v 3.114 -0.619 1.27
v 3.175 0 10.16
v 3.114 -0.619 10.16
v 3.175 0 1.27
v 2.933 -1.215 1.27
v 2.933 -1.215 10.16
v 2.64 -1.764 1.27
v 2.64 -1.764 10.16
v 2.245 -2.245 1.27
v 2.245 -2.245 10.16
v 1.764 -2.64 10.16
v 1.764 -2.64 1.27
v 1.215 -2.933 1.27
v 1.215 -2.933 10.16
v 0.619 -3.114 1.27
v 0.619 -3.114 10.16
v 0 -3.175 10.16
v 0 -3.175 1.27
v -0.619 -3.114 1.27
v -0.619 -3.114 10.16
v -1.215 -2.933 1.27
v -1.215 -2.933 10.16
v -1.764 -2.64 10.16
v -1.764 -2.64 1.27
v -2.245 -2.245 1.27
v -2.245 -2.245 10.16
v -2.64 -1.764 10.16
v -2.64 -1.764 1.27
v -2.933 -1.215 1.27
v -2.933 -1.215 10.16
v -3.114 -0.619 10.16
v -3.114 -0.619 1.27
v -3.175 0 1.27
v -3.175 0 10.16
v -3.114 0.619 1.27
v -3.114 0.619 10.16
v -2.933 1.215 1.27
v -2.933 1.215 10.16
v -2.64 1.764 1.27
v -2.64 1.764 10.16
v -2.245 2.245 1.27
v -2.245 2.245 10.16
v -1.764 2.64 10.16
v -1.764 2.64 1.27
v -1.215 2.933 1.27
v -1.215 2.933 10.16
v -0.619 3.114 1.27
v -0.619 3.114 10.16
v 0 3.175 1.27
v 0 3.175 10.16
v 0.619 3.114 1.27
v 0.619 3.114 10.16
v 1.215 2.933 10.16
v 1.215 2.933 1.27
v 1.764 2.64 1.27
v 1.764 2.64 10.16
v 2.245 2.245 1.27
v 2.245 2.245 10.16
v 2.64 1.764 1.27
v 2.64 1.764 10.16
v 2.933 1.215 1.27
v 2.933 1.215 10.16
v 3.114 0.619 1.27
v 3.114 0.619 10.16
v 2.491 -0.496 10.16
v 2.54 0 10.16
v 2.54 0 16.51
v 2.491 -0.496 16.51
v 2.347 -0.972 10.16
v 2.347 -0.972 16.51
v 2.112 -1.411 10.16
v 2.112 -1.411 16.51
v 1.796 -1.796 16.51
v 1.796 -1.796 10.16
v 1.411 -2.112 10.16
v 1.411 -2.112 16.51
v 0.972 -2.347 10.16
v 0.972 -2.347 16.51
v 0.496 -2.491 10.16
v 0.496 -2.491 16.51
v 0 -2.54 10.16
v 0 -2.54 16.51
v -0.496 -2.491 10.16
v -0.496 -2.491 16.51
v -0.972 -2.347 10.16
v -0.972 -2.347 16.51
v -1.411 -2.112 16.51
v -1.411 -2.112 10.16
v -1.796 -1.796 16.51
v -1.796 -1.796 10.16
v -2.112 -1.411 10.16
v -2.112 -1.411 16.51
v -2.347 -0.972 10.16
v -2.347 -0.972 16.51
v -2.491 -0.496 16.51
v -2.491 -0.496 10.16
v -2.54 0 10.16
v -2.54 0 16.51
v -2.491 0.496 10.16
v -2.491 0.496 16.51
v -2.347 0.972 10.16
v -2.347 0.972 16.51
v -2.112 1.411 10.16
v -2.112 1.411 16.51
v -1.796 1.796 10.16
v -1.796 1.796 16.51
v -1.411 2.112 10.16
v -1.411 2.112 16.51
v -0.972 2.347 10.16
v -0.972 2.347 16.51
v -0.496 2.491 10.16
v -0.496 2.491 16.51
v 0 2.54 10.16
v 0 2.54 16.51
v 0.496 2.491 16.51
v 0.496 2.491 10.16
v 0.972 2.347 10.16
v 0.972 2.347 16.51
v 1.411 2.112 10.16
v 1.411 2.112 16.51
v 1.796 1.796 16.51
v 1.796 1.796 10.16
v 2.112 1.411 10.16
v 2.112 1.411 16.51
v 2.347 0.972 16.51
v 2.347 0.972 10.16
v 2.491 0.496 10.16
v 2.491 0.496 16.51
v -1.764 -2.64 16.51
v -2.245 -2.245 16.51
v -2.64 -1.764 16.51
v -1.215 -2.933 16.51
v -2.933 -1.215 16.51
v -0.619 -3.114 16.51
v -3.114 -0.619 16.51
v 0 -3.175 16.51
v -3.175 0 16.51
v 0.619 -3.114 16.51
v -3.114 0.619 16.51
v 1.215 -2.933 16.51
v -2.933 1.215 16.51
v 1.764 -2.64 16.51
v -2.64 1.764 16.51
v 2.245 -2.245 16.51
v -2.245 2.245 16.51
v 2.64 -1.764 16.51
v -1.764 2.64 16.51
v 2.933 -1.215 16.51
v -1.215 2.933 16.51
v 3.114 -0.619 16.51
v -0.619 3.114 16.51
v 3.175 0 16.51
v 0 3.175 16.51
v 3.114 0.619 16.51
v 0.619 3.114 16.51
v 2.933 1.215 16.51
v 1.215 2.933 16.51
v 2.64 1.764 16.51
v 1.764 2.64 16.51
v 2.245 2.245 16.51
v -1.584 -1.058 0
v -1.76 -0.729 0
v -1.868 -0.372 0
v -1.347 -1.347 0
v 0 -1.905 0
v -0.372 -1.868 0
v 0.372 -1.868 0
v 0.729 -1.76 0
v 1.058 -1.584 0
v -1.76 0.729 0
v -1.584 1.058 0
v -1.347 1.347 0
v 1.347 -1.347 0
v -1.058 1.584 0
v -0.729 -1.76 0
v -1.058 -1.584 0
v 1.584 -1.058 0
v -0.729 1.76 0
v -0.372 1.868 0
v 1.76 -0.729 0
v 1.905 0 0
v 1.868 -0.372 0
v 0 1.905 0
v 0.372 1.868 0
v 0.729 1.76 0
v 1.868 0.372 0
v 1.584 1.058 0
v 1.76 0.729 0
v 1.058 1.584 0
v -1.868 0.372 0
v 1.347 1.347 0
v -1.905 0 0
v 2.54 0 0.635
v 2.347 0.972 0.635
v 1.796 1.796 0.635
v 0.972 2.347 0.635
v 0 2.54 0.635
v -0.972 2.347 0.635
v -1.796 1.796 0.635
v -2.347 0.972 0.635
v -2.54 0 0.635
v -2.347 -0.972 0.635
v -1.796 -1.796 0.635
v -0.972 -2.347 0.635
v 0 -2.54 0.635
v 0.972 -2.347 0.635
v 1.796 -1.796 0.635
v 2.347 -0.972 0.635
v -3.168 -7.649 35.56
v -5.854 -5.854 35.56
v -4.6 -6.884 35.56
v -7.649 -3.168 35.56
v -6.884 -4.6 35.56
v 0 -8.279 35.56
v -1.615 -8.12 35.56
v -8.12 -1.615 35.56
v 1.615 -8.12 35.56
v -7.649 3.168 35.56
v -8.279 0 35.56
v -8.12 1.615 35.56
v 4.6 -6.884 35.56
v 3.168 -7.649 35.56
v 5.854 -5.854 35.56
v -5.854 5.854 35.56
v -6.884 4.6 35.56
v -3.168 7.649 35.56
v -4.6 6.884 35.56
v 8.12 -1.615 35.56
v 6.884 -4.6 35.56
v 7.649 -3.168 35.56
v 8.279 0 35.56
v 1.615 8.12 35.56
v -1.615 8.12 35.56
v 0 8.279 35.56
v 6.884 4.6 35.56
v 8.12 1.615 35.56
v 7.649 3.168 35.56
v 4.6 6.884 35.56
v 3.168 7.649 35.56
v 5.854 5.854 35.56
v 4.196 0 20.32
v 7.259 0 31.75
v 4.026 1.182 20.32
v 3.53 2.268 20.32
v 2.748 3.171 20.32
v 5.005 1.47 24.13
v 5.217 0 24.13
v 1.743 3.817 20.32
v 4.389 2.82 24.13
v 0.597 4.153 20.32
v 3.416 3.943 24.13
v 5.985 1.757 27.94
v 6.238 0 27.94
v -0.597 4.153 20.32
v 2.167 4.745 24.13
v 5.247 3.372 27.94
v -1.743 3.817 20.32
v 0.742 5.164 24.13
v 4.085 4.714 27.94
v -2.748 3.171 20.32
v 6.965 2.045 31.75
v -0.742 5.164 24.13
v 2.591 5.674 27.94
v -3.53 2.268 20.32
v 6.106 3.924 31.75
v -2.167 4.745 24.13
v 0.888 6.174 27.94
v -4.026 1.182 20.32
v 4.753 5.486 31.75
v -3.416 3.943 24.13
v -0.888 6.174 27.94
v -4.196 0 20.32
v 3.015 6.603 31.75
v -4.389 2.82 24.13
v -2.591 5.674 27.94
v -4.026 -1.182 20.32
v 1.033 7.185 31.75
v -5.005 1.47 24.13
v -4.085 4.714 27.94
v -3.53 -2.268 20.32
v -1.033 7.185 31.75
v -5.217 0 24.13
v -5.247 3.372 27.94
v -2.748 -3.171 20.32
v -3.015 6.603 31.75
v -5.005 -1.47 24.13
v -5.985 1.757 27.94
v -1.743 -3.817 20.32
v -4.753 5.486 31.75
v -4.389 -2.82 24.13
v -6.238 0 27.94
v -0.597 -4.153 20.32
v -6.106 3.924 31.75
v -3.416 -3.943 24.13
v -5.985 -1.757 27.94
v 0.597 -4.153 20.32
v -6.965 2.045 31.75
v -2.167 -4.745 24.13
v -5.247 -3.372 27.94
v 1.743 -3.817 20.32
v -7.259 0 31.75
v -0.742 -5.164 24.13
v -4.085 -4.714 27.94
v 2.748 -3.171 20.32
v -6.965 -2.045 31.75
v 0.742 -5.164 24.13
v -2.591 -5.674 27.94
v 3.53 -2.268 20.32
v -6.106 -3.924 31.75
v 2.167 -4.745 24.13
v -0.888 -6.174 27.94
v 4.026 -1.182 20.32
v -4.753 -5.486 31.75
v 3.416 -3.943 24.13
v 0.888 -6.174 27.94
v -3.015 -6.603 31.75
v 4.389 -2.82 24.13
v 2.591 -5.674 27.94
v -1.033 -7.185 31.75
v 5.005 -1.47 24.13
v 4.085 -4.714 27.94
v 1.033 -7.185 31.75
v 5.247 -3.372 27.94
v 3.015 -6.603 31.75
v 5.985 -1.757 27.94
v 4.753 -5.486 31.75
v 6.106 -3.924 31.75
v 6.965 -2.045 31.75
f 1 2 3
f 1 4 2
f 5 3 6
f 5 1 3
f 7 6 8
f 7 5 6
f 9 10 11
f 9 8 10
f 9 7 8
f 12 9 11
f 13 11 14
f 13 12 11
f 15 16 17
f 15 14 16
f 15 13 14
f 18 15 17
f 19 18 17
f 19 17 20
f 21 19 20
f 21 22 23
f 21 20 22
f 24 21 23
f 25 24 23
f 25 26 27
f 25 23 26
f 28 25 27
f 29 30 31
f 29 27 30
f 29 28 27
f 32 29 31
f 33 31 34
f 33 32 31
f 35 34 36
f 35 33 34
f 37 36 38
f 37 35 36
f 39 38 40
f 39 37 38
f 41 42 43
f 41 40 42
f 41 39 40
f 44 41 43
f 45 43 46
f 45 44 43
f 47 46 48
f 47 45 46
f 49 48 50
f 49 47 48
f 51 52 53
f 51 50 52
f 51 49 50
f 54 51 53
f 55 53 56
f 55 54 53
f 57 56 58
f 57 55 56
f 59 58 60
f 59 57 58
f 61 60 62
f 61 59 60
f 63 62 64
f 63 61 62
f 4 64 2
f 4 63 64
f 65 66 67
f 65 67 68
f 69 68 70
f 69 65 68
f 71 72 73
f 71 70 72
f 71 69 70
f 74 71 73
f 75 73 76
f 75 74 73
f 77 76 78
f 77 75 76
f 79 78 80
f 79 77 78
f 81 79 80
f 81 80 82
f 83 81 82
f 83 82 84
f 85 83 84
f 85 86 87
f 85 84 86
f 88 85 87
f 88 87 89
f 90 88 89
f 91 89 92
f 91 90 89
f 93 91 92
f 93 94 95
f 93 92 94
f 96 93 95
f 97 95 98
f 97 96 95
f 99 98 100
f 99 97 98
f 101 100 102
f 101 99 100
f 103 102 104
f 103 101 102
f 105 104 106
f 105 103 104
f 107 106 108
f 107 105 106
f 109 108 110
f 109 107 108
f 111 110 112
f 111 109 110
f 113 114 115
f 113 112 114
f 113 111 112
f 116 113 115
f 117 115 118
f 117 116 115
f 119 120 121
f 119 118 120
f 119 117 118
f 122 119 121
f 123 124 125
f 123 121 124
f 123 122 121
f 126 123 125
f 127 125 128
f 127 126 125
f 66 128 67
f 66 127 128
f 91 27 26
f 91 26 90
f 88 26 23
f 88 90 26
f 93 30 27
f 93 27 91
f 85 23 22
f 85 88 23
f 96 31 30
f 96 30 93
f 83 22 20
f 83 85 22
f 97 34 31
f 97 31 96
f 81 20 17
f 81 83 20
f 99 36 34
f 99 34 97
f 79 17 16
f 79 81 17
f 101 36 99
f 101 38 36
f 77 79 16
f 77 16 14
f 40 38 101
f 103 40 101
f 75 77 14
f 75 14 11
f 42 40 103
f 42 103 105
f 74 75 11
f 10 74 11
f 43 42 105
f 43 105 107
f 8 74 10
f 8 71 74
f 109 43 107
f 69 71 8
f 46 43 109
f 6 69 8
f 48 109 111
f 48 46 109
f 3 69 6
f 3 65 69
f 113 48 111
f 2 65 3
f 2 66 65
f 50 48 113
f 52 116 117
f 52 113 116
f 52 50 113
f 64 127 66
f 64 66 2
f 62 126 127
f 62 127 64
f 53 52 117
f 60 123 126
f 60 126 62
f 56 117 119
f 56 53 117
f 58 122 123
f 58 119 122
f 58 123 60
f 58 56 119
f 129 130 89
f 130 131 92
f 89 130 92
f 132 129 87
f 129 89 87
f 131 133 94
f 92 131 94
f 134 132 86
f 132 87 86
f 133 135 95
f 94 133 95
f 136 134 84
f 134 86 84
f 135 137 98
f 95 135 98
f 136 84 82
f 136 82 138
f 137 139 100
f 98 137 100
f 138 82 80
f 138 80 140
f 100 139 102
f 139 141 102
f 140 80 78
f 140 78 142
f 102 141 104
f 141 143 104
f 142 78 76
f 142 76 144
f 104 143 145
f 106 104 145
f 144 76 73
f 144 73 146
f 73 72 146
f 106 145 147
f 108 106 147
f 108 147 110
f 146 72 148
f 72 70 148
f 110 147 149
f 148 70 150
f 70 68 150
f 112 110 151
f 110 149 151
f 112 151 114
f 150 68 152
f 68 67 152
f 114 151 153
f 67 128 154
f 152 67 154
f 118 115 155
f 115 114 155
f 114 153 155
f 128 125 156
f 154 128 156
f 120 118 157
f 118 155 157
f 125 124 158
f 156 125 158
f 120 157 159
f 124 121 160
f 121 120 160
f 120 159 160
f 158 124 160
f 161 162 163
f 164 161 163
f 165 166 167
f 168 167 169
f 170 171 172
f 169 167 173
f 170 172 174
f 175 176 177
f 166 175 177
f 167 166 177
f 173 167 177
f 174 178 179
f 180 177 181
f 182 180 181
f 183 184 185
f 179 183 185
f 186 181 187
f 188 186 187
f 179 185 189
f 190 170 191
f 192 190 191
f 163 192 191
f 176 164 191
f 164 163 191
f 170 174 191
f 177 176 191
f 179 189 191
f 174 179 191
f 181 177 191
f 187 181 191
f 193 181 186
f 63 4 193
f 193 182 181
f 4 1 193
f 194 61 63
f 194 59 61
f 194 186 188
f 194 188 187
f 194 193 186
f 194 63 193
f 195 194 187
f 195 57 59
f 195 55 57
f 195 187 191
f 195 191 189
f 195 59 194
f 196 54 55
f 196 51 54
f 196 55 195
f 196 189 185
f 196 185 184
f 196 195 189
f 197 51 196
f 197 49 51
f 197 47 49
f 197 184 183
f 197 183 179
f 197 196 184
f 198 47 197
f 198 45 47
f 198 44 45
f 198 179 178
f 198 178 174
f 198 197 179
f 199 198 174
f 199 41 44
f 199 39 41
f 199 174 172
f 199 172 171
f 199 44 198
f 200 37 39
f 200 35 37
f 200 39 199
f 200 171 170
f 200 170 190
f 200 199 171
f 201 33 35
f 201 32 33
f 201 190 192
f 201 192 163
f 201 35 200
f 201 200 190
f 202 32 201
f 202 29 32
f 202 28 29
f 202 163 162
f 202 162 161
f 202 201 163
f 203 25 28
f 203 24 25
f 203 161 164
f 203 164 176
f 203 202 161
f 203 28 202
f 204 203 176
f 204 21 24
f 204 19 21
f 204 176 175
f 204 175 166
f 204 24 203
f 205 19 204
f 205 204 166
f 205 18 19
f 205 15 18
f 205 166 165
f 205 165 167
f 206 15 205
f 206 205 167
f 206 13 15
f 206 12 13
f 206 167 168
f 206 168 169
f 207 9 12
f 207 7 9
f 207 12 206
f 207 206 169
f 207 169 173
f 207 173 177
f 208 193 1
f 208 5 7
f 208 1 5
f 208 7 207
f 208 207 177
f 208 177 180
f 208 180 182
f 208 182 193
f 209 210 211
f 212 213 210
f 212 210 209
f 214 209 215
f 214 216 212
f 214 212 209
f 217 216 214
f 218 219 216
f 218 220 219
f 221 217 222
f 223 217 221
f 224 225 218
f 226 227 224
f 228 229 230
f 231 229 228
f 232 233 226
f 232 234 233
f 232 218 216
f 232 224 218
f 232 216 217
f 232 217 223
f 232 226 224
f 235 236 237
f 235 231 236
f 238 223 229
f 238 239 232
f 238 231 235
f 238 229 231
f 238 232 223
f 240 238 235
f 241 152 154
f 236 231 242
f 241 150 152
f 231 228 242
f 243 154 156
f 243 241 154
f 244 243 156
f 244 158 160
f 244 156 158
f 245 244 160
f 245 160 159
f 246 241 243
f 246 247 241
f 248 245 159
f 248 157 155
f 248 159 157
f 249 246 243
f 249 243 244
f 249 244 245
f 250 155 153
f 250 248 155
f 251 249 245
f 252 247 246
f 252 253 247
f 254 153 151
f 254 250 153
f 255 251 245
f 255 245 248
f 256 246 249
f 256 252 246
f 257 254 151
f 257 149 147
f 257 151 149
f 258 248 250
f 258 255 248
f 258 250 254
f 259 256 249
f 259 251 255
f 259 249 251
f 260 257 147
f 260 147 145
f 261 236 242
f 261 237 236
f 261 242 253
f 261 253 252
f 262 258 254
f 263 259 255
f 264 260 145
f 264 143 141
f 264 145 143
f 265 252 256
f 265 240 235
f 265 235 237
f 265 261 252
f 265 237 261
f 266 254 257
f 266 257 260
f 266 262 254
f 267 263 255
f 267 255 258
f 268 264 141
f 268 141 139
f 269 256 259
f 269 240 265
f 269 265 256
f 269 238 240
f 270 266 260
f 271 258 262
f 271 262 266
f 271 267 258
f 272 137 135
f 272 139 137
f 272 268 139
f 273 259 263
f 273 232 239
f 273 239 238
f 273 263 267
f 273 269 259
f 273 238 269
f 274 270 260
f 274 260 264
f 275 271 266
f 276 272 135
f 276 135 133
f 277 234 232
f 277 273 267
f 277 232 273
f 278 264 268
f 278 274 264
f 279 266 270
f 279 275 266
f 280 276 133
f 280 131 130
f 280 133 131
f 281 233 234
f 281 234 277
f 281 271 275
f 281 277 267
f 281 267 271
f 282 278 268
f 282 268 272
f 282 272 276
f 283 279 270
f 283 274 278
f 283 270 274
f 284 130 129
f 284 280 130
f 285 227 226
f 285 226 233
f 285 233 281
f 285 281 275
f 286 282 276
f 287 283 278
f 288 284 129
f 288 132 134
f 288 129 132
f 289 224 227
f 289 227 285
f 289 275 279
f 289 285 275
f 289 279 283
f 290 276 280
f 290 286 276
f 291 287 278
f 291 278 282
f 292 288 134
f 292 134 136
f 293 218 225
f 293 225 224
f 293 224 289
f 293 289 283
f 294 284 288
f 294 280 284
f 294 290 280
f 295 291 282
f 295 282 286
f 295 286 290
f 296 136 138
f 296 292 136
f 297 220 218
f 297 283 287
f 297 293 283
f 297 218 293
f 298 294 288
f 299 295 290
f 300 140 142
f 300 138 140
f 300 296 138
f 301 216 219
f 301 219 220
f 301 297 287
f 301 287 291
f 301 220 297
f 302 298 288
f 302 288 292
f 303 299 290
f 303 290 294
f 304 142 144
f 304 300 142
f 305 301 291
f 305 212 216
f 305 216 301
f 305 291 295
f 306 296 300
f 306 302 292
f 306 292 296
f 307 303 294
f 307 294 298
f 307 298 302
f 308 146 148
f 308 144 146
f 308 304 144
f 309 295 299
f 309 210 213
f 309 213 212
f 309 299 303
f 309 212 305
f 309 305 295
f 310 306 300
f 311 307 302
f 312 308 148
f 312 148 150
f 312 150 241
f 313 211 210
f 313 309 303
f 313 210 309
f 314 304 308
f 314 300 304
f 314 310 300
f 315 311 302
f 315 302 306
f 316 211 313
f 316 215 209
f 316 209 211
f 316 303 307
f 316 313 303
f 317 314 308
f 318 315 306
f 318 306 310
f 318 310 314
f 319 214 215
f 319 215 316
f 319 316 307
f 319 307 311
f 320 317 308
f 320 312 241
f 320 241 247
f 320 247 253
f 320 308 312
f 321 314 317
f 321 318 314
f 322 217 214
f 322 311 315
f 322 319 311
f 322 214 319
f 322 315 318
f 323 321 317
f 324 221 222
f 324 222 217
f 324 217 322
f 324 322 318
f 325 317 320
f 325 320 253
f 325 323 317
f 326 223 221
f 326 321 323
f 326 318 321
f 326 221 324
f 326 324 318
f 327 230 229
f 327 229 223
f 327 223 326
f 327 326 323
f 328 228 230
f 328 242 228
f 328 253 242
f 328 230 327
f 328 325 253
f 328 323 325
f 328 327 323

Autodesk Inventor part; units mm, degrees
ref_plane "YZ Plane" through (0, 0, 0) normal (1, 0, 0) x (0, 1, 0)
ref_plane "XZ Plane" through (0, 0, 0) normal (0, 1, 0) x (-1, 0, 0)
ref_plane "XY Plane" through (0, 0, 0) normal (0, 0, 1) x (1, 0, 0)
sketch "Sketch1" plane through (0, 0, 0) normal (0, 0, 1) x (1, 0, 0)
  circle A0 centre (0, 0) radius 3.175
  dimension "d0" = 6.35
extrude "Extrusion1" add sketch "Sketch1" along normal blind 10.16
thread "Thread1" size "1/4-20 UNC" class "2A" standard "ANSI Unified Screw Threads" full length
chamfer "Chamfer1" distance 1.27 angle 45 1 edges at (-3.175, 0, 0)
sketch "Sketch3" plane through (0, 0, 10.16) normal (0, 0, 1) x (1, 0, 0)
  circle A0 centre (0, 0) radius 2.54
  dimension "d11" = 5.08
extrude "Extrusion3" add sketch "Sketch3" along normal blind 6.35
sketch "Sketch4" plane through (0, 0, 16.51) normal (0, 0, 1) x (1, 0, 0)
  circle A0 centre (0, 0) radius 3.175
  dimension "d14" = 6.35
extrude "Extrusion4" add sketch "Sketch4" along normal blind 19.05 draft 15
properties part number "peg-01"
